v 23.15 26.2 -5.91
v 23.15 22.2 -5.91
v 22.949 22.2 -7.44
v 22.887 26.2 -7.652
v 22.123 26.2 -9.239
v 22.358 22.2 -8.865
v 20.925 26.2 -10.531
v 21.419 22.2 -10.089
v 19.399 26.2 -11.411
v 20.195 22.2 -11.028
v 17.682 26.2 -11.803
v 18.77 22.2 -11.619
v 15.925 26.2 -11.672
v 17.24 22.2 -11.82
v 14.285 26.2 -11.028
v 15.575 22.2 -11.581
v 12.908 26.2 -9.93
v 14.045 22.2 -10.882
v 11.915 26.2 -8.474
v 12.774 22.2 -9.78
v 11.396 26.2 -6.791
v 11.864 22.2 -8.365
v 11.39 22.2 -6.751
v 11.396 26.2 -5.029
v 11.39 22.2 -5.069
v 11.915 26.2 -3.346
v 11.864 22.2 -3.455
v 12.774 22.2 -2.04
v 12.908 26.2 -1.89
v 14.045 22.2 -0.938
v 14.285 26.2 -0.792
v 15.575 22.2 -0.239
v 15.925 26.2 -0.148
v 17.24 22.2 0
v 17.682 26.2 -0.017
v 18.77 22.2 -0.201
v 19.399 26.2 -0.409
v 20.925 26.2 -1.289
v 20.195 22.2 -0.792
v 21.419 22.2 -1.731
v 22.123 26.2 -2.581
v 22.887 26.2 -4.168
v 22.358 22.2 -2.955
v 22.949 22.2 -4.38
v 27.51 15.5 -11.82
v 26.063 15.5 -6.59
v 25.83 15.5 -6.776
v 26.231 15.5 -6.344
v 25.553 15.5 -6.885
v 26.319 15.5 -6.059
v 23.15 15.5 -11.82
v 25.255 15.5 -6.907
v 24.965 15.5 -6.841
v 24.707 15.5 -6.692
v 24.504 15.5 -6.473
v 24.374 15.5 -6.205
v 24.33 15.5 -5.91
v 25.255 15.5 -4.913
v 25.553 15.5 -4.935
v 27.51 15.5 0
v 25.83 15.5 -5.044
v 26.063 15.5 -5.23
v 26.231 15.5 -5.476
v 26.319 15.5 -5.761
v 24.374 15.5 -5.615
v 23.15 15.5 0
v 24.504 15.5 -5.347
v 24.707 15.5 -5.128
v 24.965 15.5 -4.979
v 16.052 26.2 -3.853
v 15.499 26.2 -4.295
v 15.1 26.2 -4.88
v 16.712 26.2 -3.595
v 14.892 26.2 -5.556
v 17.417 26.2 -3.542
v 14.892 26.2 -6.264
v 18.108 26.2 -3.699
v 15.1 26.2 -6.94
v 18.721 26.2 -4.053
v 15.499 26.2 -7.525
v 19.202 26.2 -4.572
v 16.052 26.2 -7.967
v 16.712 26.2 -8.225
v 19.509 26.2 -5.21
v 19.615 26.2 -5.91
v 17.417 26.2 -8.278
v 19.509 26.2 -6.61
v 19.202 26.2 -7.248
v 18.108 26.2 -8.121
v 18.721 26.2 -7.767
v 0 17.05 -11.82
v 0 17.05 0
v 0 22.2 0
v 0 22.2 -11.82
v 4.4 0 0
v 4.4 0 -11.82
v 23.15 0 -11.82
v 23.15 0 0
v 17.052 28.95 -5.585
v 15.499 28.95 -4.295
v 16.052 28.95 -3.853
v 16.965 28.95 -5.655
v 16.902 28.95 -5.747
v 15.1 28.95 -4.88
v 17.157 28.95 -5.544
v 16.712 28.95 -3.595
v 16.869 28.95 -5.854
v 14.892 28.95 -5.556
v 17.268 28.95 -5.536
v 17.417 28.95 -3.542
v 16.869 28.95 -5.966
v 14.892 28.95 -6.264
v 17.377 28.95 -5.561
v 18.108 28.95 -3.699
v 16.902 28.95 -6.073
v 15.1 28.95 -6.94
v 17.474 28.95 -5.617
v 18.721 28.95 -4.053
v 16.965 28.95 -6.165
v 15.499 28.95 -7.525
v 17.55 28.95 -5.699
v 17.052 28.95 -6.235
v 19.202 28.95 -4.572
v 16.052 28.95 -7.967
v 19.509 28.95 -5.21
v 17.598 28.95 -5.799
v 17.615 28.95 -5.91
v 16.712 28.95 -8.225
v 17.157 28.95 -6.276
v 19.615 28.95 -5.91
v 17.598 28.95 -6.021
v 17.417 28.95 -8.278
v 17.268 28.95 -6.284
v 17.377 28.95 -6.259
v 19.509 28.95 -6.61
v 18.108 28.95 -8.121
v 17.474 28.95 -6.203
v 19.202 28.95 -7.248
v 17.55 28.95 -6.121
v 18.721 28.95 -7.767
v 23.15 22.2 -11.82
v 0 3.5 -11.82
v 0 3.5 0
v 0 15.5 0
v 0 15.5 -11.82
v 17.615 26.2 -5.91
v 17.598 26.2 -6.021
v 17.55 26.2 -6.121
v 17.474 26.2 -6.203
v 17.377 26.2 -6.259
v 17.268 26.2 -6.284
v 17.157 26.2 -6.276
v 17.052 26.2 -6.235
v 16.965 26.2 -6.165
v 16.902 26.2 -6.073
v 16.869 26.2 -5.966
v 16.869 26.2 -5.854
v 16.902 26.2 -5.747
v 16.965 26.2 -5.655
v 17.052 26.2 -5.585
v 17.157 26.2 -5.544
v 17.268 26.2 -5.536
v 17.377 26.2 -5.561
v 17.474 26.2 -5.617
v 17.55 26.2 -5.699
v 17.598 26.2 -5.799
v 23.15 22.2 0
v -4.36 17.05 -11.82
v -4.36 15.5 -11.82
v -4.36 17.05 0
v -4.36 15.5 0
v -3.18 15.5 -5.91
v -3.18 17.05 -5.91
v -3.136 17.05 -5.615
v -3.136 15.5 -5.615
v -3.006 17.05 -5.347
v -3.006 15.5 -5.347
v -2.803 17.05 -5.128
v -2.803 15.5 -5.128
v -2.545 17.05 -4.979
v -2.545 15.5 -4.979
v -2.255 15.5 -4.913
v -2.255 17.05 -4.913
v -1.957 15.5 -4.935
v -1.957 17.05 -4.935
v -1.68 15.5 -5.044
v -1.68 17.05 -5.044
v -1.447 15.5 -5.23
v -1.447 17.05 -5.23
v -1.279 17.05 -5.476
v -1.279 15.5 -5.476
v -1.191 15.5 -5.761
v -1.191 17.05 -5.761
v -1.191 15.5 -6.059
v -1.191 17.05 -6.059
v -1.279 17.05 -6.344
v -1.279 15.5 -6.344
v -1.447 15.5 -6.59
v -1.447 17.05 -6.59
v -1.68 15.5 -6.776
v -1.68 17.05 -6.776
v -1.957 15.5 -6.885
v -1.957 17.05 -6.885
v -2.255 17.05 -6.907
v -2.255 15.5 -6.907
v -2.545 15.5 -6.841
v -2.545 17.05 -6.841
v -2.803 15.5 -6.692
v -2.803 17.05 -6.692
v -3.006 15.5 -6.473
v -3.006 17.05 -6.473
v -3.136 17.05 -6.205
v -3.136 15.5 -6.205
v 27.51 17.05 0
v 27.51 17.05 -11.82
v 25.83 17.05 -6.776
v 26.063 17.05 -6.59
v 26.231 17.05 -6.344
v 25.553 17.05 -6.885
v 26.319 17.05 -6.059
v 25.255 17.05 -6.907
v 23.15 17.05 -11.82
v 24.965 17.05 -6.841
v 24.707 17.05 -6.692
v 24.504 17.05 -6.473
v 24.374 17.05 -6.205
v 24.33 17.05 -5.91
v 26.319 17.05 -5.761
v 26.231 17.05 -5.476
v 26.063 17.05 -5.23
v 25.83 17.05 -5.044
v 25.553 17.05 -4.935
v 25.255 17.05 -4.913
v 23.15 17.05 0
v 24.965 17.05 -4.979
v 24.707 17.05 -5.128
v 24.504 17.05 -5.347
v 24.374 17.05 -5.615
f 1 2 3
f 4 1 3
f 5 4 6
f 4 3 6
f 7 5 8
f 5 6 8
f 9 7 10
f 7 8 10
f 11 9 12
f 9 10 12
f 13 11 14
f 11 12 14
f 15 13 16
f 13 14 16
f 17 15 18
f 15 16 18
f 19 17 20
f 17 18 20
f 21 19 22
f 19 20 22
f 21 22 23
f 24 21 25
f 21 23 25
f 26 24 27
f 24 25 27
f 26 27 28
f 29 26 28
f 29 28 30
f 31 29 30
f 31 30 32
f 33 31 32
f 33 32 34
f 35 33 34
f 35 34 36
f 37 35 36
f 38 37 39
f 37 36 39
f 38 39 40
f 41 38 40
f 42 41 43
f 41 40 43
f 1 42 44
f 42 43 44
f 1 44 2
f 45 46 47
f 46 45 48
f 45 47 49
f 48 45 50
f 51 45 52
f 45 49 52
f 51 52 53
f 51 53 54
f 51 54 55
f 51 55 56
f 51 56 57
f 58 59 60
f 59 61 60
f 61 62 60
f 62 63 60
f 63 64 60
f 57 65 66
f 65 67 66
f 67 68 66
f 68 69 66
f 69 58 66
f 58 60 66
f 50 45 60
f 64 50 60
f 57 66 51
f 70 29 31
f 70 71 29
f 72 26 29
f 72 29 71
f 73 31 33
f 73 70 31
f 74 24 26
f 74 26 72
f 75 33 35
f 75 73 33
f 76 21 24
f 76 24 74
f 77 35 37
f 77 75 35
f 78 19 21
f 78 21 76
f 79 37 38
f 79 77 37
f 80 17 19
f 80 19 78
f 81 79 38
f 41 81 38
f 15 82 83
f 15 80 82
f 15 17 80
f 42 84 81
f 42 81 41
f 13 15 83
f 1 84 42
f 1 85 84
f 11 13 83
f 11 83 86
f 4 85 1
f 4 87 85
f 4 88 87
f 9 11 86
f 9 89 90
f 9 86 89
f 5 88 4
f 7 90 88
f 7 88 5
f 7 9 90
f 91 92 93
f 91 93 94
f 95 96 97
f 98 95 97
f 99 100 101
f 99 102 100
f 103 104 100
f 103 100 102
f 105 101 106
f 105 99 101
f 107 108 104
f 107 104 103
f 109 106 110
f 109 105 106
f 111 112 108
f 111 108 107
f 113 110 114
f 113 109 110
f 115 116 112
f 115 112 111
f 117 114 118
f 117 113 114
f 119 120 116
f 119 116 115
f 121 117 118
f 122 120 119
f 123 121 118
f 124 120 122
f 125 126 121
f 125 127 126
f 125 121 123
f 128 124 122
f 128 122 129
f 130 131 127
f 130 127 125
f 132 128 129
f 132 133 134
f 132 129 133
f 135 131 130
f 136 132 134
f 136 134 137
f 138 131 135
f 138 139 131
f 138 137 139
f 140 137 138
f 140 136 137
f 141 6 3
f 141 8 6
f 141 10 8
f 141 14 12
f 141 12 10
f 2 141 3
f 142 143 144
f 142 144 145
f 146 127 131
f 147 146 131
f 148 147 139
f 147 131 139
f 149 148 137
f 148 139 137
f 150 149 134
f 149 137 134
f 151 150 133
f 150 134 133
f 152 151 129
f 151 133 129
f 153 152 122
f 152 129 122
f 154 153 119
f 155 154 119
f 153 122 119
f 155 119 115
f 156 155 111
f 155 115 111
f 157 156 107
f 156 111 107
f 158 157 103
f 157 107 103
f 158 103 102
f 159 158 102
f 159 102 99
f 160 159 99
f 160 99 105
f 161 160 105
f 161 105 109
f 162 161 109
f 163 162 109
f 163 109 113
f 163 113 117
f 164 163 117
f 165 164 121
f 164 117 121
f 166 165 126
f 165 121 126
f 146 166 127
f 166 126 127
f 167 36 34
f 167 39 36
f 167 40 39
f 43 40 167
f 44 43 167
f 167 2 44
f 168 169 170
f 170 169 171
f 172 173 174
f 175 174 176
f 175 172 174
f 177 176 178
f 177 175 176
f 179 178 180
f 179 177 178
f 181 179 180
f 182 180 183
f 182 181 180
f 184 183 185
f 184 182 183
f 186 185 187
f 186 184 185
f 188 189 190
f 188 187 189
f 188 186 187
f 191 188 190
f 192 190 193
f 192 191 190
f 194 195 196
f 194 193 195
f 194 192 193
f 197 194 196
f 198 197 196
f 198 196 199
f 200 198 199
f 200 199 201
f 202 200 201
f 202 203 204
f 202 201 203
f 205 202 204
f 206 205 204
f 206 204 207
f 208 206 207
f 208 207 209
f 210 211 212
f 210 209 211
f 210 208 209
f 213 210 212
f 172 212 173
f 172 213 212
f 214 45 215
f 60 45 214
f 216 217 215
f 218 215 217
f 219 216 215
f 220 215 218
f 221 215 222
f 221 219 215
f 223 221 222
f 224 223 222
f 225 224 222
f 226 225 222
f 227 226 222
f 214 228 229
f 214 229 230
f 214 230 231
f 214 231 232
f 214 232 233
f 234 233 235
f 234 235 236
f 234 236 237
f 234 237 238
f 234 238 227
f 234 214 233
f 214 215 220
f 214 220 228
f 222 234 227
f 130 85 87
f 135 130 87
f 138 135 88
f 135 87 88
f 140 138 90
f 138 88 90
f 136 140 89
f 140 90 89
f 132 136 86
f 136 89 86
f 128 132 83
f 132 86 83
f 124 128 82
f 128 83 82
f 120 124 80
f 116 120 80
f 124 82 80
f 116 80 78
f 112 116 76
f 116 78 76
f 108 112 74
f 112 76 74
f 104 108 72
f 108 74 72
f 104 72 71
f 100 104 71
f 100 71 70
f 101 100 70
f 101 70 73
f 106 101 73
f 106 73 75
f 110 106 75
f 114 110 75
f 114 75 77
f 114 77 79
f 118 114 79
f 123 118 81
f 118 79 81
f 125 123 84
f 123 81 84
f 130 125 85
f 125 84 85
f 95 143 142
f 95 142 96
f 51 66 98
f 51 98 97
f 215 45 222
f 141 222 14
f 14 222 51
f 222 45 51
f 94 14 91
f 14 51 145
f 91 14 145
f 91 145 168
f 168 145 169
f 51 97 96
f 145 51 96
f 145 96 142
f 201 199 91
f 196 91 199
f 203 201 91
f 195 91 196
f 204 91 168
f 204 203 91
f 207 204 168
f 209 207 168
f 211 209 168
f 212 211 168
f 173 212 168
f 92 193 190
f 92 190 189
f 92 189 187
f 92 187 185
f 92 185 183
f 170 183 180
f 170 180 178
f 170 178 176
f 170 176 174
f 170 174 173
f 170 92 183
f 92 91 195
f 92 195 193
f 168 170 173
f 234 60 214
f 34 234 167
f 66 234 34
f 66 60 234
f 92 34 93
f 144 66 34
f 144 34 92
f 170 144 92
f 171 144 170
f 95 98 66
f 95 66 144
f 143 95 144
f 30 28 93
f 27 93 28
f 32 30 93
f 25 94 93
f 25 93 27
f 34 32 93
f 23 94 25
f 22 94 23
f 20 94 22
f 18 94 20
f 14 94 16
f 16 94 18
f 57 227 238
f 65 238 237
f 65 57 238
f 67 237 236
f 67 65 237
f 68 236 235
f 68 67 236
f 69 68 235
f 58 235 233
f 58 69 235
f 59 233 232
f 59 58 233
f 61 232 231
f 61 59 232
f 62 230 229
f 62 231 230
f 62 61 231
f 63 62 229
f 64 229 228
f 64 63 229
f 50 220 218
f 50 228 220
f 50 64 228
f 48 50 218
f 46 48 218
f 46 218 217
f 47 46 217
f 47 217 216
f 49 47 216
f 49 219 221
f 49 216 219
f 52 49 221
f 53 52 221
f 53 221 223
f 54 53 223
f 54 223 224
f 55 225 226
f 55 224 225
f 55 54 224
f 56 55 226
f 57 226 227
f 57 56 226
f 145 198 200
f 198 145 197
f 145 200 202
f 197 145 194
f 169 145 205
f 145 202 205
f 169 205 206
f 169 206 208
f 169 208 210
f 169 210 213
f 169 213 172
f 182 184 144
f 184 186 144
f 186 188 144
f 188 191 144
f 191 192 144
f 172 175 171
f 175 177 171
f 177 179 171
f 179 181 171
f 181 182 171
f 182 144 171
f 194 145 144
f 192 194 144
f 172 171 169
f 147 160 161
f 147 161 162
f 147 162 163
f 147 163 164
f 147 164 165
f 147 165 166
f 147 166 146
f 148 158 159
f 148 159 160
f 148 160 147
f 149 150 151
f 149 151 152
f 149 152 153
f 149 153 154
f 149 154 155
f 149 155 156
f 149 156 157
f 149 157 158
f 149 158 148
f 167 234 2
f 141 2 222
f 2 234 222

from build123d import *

# Parameters (mm, degrees)
SKETCH1_W           = 23.15
SKETCH1_H           = 11.82
BOSS_EXTRUDE1_DEPTH = 22.2
SKETCH2_W           = 31.87
SKETCH2_H           = 11.82
BOSS_EXTRUDE2_DEPTH = 1.55
SKETCH3_R           = 1
CUT_EXTRUDE1_DEPTH  = 7.7
CUT_EXTRUDE2_DEPTH  = 12.82
SKETCH5_R           = 5.91
BOSS_EXTRUDE3_DEPTH = 4
SKETCH6_R           = 2.375
BOSS_EXTRUDE4_DEPTH = 2.75
SKETCH7_R           = 0.375
CUT_EXTRUDE3_DEPTH  = 2.75


with BuildPart() as part:
    # Sketch1 → Boss-Extrude1 (new body)
    with BuildSketch(Plane(origin=(0, 0, 0), x_dir=(1, 0, 0), z_dir=(0, 1, 0))):
        with Locations((11.575, 5.91)):
            Rectangle(SKETCH1_W, SKETCH1_H)
    extrude(amount=BOSS_EXTRUDE1_DEPTH)

    # Sketch2 → Boss-Extrude2 (add)
    with BuildSketch(Plane(origin=(0, 15.5, 0), x_dir=(-1, 0, 0), z_dir=(0, 1, 0))):
        with Locations((-11.575, -5.91)):
            Rectangle(SKETCH2_W, SKETCH2_H)
    extrude(amount=BOSS_EXTRUDE2_DEPTH)

    # Sketch3 → Cut-Extrude1 (cut, through all)
    with BuildSketch(Plane(origin=(0, 15.5, 0), x_dir=(-1, 0, 0), z_dir=(0, 1, 0))):
        with Locations((-25.33, -5.91)):
            Circle(SKETCH3_R)
        with Locations((2.18, -5.91)):
            Circle(SKETCH3_R)
    extrude(amount=CUT_EXTRUDE1_DEPTH, mode=Mode.SUBTRACT)

    # Sketch4 → Cut-Extrude2 (cut, through all)
    with BuildSketch(Plane.XY):
        Polygon((-3.075644921, 5.946535733), (9.026256409, -3.679976689), (-2.538069932, -3.679976689), align=None)
    extrude(amount=-CUT_EXTRUDE2_DEPTH, mode=Mode.SUBTRACT)

    # Sketch5 → Boss-Extrude3 (add)
    with BuildSketch(Plane(origin=(0, 22.2, 0), x_dir=(1, 0, 0), z_dir=(0, 1, 0))):
        with Locations((17.24, 5.91)):
            Circle(SKETCH5_R)
    extrude(amount=BOSS_EXTRUDE3_DEPTH)

    # Sketch6 → Boss-Extrude4 (add)
    with BuildSketch(Plane(origin=(0, 26.2, 0), x_dir=(1, 0, 0), z_dir=(0, 1, 0))):
        with Locations((17.24, 5.91)):
            Circle(SKETCH6_R)
    extrude(amount=BOSS_EXTRUDE4_DEPTH)

    # Sketch7 → Cut-Extrude3 (cut)
    with BuildSketch(Plane(origin=(0, 28.95, 0), x_dir=(1, 0, 0), z_dir=(0, 1, 0))):
        with Locations((17.24, 5.91)):
            Circle(SKETCH7_R)
    extrude(amount=-CUT_EXTRUDE3_DEPTH, mode=Mode.SUBTRACT)


solid = part.part
